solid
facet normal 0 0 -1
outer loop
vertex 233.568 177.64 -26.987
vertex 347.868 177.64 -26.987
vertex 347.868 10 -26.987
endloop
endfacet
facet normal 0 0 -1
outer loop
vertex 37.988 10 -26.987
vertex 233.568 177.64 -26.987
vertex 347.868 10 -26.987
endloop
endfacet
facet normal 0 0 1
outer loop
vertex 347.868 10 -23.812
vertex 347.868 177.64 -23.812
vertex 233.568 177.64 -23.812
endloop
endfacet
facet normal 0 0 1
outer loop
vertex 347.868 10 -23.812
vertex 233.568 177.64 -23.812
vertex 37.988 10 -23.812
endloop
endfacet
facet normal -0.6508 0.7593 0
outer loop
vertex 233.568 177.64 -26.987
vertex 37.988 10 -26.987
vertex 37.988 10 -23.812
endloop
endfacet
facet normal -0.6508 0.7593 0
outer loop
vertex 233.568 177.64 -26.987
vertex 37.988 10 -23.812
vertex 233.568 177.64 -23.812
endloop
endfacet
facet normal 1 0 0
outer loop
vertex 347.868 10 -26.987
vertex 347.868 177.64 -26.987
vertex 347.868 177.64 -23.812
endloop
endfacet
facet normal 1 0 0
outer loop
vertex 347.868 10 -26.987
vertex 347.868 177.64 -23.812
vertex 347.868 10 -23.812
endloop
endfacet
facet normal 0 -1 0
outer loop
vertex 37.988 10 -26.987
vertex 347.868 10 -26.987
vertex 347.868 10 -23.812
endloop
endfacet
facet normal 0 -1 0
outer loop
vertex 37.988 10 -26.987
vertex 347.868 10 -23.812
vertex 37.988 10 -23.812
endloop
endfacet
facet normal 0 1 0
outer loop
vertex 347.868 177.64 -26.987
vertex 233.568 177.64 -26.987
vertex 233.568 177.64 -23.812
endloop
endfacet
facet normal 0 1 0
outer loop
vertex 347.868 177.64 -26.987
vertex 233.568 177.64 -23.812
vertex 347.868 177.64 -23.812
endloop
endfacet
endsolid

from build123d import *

# Parameters (mm, degrees)
SKETCH1_W                = 381
SKETCH1_H                = 50.8
BOSS_EXTRUDE1_DEPTH      = 10
BOSS_EXTRUDE2_DEPTH      = 1.5875
BOSS_EXTRUDE2_DEPTH_BACK = 1.5875
SKETCH3_W                = 381
SKETCH3_H                = 50.8
CUT_EXTRUDE1_DEPTH       = 420.338538176


with BuildPart() as part:
    # Sketch1 → Boss-Extrude1 (new body)
    with BuildSketch(Plane(origin=(0, 0, 0), x_dir=(1, 0, 0), z_dir=(0, 1, 0))):
        with Locations((190.5, 25.4)):
            Rectangle(SKETCH1_W, SKETCH1_H)
    extrude(amount=BOSS_EXTRUDE1_DEPTH)

    # Sketch3 → Cut-Extrude1 (cut, through all)
    with BuildSketch(Plane(origin=(0, 10, 0), x_dir=(1, 0, 0), z_dir=(0, 1, 0))):
        with Locations((190.5, 25.4)):
            Rectangle(SKETCH3_W, SKETCH3_H)
    extrude(amount=-CUT_EXTRUDE1_DEPTH, mode=Mode.SUBTRACT)


with BuildPart() as body_2:
    # Sketch2 → Boss-Extrude2 (new, two sides: drawn at the far end of the back side and taken through both)
    with BuildSketch(Plane.XY.offset(-25.4).offset(-BOSS_EXTRUDE2_DEPTH_BACK)):
        Polygon((347.867965721, 10), (37.987965721, 10), (233.567965721, 177.64), (347.867965721, 177.64), align=None)
    extrude(amount=BOSS_EXTRUDE2_DEPTH + BOSS_EXTRUDE2_DEPTH_BACK)


solid = body_2.part
